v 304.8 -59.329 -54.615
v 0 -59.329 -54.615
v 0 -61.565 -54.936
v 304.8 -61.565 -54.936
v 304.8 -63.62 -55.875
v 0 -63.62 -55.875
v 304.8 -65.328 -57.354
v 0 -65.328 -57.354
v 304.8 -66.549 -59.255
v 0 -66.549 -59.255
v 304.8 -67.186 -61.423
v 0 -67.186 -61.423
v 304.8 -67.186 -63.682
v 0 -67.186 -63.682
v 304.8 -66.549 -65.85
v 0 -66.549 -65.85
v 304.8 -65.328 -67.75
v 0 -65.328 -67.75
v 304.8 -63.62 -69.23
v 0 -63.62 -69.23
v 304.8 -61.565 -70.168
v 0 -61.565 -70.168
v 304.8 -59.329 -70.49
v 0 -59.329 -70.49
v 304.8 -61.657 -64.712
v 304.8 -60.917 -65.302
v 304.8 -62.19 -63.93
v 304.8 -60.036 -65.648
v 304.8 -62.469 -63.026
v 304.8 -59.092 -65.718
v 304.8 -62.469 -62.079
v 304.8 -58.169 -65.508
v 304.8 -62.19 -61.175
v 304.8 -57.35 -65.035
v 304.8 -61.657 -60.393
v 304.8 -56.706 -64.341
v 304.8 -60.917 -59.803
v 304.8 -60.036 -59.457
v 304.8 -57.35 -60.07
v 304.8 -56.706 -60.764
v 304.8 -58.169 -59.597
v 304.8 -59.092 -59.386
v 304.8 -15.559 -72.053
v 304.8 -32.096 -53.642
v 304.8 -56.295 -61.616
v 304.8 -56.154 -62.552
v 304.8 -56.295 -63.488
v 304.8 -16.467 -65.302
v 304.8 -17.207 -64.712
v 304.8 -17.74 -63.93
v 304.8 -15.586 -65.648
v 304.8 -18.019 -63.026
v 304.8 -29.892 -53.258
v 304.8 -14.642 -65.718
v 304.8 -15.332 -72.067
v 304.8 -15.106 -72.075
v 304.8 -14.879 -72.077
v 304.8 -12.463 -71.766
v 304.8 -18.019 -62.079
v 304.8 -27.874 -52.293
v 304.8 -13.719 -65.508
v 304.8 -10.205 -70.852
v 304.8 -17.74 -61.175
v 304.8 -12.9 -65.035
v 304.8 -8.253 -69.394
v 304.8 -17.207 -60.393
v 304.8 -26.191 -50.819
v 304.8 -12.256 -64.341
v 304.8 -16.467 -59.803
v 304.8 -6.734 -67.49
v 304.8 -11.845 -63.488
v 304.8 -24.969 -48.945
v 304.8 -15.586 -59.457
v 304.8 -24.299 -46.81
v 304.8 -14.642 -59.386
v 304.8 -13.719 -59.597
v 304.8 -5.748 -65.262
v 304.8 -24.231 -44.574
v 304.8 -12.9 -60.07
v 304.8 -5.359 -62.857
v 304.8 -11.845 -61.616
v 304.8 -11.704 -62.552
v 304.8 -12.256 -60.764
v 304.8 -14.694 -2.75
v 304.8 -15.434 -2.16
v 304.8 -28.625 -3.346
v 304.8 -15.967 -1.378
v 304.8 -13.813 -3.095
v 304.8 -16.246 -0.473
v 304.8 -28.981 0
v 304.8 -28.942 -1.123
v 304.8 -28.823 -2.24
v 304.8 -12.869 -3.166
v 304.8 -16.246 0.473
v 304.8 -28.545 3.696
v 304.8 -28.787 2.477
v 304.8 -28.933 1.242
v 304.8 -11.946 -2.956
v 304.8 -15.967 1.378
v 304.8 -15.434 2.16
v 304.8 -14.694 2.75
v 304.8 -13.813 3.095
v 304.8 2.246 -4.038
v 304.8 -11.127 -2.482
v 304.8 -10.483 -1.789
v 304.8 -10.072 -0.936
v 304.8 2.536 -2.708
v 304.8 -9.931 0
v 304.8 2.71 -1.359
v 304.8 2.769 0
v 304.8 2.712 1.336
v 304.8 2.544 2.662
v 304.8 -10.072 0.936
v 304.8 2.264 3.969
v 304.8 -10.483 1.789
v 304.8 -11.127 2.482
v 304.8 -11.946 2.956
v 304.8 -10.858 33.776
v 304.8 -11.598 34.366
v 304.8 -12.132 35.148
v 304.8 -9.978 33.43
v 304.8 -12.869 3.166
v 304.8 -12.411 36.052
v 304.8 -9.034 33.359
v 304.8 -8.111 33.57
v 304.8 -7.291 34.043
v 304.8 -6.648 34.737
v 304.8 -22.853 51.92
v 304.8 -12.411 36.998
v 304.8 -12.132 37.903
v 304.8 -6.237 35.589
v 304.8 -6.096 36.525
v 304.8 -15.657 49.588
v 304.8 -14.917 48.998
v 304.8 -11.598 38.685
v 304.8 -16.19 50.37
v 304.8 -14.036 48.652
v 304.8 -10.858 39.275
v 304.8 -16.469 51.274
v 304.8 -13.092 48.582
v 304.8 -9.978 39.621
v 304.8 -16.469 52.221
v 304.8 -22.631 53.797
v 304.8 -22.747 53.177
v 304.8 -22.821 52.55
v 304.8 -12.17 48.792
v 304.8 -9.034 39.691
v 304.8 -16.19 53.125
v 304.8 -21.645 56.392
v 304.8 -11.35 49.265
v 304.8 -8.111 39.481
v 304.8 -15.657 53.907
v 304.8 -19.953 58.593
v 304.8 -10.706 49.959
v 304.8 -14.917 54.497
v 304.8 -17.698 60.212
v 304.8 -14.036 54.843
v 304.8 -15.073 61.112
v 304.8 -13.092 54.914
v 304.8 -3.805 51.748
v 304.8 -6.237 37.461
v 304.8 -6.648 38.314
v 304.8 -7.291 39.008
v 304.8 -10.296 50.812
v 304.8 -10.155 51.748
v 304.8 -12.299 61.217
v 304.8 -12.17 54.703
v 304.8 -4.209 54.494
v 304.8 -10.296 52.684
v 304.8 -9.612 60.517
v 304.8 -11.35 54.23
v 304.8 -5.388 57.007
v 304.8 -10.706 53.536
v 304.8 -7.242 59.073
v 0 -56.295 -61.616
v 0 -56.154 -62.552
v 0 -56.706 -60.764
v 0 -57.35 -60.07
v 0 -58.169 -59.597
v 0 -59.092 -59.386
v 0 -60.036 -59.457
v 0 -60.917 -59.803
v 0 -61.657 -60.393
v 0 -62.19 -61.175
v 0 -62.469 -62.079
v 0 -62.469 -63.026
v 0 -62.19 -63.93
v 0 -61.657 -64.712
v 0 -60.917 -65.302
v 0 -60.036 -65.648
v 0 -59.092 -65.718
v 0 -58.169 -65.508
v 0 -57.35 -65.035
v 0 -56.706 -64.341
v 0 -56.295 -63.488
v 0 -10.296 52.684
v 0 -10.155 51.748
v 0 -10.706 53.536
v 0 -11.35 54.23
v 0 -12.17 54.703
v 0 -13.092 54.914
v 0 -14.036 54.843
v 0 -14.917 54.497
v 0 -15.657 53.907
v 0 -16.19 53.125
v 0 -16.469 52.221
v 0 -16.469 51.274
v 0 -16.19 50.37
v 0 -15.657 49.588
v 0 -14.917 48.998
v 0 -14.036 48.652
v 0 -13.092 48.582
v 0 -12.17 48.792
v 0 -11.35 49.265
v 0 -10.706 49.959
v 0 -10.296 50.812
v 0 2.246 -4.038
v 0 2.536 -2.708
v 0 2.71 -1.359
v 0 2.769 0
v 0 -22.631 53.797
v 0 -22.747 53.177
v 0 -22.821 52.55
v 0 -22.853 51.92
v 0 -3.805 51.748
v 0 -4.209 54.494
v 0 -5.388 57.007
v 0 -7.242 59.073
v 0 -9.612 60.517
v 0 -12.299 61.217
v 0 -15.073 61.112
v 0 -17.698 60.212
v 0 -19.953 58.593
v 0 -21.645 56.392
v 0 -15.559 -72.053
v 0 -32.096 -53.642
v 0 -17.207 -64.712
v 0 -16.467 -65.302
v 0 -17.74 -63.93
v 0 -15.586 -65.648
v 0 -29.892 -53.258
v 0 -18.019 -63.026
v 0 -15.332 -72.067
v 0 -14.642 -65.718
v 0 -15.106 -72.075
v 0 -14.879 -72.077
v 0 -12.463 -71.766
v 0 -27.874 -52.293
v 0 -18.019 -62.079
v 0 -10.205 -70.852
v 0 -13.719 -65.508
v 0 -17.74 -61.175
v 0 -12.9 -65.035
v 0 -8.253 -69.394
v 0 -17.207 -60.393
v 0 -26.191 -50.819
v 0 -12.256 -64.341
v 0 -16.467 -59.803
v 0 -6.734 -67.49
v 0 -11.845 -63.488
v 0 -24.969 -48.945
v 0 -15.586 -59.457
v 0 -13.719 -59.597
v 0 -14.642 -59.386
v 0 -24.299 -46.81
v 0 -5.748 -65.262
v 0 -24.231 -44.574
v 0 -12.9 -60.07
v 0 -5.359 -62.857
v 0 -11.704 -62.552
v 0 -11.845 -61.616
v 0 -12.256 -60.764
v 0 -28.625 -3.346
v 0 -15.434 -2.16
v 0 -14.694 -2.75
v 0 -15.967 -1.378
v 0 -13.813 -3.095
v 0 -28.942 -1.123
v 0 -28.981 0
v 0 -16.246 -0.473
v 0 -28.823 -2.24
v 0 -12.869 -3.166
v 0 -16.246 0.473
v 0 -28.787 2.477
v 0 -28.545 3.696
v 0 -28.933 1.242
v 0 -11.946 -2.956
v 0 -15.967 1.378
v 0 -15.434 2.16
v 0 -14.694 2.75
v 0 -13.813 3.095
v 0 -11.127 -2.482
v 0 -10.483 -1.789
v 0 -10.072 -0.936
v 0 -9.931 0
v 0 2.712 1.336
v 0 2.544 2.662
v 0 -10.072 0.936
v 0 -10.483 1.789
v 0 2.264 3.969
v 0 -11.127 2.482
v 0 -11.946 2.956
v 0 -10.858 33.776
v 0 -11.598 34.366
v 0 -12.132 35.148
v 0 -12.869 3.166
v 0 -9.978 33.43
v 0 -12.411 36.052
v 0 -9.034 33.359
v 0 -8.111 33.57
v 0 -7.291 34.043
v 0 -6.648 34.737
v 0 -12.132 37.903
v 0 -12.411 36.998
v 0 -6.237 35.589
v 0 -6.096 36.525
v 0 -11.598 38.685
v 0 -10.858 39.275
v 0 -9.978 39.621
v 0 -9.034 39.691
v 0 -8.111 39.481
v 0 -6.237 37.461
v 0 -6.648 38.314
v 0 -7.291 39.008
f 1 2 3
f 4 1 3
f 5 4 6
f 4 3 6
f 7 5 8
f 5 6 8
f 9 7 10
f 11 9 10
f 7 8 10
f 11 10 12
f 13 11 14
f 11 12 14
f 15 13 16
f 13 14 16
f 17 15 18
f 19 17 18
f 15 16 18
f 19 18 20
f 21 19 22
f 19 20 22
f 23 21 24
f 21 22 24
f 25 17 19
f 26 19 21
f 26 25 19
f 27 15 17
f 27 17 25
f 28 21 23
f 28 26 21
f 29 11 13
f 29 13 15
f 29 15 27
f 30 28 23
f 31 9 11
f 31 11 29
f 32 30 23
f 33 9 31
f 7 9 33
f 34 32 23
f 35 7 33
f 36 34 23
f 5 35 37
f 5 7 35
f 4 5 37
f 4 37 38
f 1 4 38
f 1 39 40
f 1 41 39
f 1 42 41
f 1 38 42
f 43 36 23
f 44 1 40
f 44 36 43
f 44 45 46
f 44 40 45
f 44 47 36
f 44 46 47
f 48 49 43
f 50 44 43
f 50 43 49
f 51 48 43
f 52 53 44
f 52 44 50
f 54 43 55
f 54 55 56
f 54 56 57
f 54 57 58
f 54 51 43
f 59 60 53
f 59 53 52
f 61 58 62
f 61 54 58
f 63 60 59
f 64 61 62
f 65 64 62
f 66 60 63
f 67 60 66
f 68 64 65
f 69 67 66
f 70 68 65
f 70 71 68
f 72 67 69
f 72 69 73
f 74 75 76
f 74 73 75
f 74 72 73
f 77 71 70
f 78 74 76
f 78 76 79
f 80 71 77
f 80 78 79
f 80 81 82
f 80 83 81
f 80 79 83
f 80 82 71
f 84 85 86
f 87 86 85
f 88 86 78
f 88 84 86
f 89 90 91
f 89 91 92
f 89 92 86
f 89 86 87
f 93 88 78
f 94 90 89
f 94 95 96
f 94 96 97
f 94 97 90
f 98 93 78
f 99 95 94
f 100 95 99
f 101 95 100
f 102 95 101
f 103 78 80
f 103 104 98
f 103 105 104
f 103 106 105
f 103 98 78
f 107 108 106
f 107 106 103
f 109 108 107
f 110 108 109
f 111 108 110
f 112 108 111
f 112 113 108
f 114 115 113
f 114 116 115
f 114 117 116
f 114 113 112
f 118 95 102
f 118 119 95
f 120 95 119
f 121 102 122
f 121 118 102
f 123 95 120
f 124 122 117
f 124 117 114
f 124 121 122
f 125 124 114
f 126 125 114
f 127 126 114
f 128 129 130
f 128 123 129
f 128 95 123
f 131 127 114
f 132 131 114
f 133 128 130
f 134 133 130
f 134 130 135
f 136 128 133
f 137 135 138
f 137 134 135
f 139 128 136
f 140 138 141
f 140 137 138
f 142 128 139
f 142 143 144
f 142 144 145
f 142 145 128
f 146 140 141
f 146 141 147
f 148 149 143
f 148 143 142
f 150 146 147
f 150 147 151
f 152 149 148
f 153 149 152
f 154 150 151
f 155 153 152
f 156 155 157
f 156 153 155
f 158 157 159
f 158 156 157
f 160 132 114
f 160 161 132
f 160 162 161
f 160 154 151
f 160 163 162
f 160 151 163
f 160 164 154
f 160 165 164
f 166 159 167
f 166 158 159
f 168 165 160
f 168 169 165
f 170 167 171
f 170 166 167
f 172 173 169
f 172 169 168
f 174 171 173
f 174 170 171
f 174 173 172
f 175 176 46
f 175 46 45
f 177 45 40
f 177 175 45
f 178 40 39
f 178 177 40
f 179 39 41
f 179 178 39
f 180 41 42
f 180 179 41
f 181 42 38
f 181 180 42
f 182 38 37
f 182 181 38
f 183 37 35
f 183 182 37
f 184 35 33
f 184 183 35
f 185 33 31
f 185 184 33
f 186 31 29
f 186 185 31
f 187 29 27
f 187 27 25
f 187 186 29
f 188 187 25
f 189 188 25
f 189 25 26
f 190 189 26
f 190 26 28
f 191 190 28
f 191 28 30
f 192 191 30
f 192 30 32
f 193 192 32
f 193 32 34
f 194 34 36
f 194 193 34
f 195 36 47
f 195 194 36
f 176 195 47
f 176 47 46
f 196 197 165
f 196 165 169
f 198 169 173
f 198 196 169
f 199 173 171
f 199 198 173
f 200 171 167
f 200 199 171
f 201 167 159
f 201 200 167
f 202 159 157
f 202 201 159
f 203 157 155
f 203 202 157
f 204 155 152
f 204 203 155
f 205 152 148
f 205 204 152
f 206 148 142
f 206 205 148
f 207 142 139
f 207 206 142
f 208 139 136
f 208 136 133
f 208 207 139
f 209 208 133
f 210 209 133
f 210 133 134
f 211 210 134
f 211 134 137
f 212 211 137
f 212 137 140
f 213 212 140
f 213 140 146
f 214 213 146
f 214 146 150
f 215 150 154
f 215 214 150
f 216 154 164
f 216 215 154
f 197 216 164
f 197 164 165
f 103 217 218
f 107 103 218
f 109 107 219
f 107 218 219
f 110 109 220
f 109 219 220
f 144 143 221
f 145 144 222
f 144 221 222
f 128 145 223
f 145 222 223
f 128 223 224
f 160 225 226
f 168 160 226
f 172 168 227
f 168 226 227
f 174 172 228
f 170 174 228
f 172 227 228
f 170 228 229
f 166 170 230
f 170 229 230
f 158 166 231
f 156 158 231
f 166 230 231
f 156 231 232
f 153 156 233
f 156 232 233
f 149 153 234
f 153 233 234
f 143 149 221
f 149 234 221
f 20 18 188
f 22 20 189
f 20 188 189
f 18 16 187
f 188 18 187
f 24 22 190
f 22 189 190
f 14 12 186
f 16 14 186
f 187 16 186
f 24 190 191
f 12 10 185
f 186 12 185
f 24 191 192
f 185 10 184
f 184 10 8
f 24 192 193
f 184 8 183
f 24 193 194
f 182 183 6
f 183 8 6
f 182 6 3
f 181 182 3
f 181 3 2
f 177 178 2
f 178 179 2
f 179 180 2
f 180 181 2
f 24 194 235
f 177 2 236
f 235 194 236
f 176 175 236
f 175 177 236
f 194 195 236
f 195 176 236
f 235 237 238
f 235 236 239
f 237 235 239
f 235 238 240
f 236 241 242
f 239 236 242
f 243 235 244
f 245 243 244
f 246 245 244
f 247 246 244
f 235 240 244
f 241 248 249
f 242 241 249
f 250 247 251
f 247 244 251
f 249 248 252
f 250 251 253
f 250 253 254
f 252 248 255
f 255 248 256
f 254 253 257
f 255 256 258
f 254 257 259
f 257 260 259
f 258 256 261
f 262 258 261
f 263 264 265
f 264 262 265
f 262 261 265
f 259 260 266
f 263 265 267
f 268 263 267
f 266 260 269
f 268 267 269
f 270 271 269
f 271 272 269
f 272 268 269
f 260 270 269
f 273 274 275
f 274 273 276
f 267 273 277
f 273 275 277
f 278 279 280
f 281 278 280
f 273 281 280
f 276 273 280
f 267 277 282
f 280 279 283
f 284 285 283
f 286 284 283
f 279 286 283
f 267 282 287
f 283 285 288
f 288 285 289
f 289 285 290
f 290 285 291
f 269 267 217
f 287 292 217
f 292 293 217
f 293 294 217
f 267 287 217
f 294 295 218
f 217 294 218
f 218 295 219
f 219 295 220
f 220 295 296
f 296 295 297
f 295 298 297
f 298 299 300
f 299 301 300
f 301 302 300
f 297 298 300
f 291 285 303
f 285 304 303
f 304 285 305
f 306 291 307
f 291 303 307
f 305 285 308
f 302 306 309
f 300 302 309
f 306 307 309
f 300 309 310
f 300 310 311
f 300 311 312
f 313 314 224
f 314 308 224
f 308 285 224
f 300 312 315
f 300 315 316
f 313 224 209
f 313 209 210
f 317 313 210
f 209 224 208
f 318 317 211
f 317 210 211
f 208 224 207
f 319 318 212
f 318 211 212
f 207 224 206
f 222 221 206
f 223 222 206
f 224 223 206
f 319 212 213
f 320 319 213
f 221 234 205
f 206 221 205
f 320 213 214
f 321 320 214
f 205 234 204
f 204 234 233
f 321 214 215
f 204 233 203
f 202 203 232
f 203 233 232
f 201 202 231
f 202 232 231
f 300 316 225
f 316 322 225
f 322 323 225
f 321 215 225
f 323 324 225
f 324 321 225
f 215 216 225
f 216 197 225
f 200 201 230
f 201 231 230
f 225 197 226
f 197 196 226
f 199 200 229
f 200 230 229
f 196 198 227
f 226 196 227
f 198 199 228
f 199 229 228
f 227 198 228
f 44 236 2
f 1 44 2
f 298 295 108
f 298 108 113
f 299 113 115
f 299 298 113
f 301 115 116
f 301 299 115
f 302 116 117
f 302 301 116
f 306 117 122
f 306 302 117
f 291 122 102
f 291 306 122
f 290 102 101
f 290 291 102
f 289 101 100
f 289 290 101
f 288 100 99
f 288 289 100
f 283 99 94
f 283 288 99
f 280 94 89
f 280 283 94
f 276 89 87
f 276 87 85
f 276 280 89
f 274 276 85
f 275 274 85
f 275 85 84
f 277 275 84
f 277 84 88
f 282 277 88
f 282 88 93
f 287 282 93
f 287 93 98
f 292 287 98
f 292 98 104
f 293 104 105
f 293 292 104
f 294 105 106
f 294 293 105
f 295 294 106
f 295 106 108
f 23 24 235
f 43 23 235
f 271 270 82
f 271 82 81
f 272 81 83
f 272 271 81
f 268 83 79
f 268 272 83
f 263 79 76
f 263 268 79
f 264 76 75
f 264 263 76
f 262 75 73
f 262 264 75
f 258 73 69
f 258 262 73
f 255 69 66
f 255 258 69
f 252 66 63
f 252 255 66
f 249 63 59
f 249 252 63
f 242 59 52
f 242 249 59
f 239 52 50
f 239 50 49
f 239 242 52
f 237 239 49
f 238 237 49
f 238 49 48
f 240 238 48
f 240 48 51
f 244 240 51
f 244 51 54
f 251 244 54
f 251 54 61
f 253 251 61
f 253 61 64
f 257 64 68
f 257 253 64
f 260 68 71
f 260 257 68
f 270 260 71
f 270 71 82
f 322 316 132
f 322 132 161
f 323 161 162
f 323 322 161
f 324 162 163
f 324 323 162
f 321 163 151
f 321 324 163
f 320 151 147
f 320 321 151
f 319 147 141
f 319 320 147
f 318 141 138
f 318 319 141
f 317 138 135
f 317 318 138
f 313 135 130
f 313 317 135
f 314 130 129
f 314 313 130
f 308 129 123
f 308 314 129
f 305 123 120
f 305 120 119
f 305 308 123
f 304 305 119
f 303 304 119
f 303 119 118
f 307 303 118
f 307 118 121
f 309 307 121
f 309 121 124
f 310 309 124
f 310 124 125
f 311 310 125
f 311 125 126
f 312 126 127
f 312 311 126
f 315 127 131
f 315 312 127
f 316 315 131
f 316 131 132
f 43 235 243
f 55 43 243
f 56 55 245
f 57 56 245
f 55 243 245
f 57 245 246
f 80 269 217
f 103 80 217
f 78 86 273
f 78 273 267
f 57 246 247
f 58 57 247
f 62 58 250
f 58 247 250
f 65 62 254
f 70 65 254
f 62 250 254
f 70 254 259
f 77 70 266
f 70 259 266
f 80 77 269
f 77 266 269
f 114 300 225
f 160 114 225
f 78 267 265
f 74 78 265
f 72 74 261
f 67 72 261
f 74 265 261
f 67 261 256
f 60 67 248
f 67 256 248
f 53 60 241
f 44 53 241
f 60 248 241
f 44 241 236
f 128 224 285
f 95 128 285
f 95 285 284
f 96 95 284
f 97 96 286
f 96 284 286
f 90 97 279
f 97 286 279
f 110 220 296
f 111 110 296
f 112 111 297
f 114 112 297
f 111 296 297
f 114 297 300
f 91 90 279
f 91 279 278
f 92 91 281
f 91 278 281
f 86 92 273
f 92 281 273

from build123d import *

# Parameters (mm, degrees)
F0_R     = 3.175
F1_DEPTH = 304.8


with BuildPart() as f1:
    # F0 (on Right) → F1 (new body)
    with BuildSketch(Plane.YZ):
        with BuildLine():
            ThreePointArc((-22.8529511317, 51.9202167742), (-13.4157885587, 42.2230655236), (-3.8045140282, 51.7476747914))
            ThreePointArc((-3.8045140282, 51.7476747914), (-12.2986988853, 61.2167320381), (-22.6314001471, 53.7971965969))
            Line((-22.6314001471, 53.7971965969), (-22.8529511317, 51.9202167742))
        make_face()
        with Locations((-13.3295140282, 51.7476747914)):
            Circle(F0_R, mode=Mode.SUBTRACT)
        with BuildLine():
            Line((2.2644576156, 3.968923864), (-3.8045140282, 51.7476747914))
            ThreePointArc((-3.8045140282, 51.7476747914), (-13.4157885587, 42.2230655236), (-22.8529511317, 51.9202167742))
            Line((-22.8529511317, 51.9202167742), (-28.545122604, 3.6961431112))
            ThreePointArc((-28.545122604, 3.6961431112), (-13.2469481423, 15.8743778228), (2.2644576156, 3.968923864))
        make_face()
        with Locations((-9.2709995806, 36.5252)):
            Circle(F0_R, mode=Mode.SUBTRACT)
        with BuildLine():
            Line((-22.8529511317, 51.9202167742), (-22.6314001471, 53.7971965969))
            ThreePointArc((-22.6314001471, 53.7971965969), (-22.78884603, 52.8642154666), (-22.8529511317, 51.9202167742))
        make_face()
        with BuildLine():
            Line((2.7685998529, 0), (2.2644576156, 3.968923864))
            ThreePointArc((2.2644576156, 3.968923864), (-13.2469481423, 15.8743778228), (-28.545122604, 3.6961431112))
            Line((-28.545122604, 3.6961431112), (-28.9814001471, 0))
            Line((-28.9814001471, 0), (-28.6248095933, -3.3458322221))
            ThreePointArc((-28.6248095933, -3.3458322221), (-13.462164486, -15.8710130973), (2.2464969737, -4.0378428646))
            Line((2.2464969737, -4.0378428646), (2.7685998529, 0))
        make_face()
        with Locations((-13.1064001471, 0)):
            Circle(F0_R, mode=Mode.SUBTRACT)
        with BuildLine():
            ThreePointArc((2.7685998529, 0), (2.6420599679, 2.0004072107), (2.2644576156, 3.968923864))
            Line((2.2644576156, 3.968923864), (2.7685998529, 0))
        make_face()
        with BuildLine():
            Line((-28.9814001471, 0), (-28.545122604, 3.6961431112))
            ThreePointArc((-28.545122604, 3.6961431112), (-28.8719534834, 1.8609011253), (-28.9814001471, 0))
        make_face()
        with BuildLine():
            ThreePointArc((2.2464969737, -4.0378428646), (2.637533078, -2.0357287648), (2.7685998529, 0))
            Line((2.7685998529, 0), (2.2464969737, -4.0378428646))
        make_face()
        with BuildLine():
            Line((-28.6248095933, -3.3458322221), (-28.9814001471, 0))
            ThreePointArc((-28.9814001471, 0), (-28.8920007844, -1.6823904185), (-28.6248095933, -3.3458322221))
        make_face()
        with BuildLine():
            Line((-5.3589790656, -62.8571261481), (2.2464969737, -4.0378428646))
            ThreePointArc((2.2464969737, -4.0378428646), (-13.462164486, -15.8710130973), (-28.6248095933, -3.3458322221))
            Line((-28.6248095933, -3.3458322221), (-24.2308362037, -44.5737828668))
            ThreePointArc((-24.2308362037, -44.5737828668), (-26.1909962764, -50.8187140835), (-32.0960141584, -53.6422149647))
            Line((-32.0960141584, -53.6422149647), (-59.3291009865, -54.6148252086))
            ThreePointArc((-59.3291009865, -54.6148252086), (-53.7164409108, -56.9396651329), (-51.3916009865, -62.5523252086))
            ThreePointArc((-51.3916009865, -62.5523252086), (-53.7164409108, -68.1649852842), (-59.3291009865, -70.4898252086))
            Line((-59.3291009865, -70.4898252086), (-15.5585914323, -72.0530576926))
            ThreePointArc((-15.5585914323, -72.0530576926), (-21.3696124649, -55.5810351021), (-5.3541009865, -62.5523252086))
            ThreePointArc((-5.3541009865, -62.5523252086), (-5.3553205843, -62.7047451945), (-5.3589790656, -62.8571261481))
        make_face()
        with BuildLine():
            ThreePointArc((-14.8791009865, -72.0773252086), (-8.2525484872, -69.3944321191), (-5.3589790656, -62.8571261481))
            ThreePointArc((-5.3589790656, -62.8571261481), (-5.3553205843, -62.7047451945), (-5.3541009865, -62.5523252086))
            ThreePointArc((-5.3541009865, -62.5523252086), (-21.3696124649, -55.5810351021), (-15.5585914323, -72.0530576926))
            Line((-15.5585914323, -72.0530576926), (-14.8791009865, -72.0773252086))
        make_face()
        with Locations((-14.8791009865, -62.5523252086)):
            Circle(F0_R, mode=Mode.SUBTRACT)
        with BuildLine():
            ThreePointArc((-15.5585914323, -72.0530576926), (-15.2190628146, -72.0712563962), (-14.8791009865, -72.0773252086))
            Line((-14.8791009865, -72.0773252086), (-15.5585914323, -72.0530576926))
        make_face()
        with BuildLine():
            ThreePointArc((-51.3916009865, -62.5523252086), (-53.7164409108, -56.9396651329), (-59.3291009865, -54.6148252086))
            ThreePointArc((-59.3291009865, -54.6148252086), (-67.2666009865, -62.5523252086), (-59.3291009865, -70.4898252086))
            ThreePointArc((-59.3291009865, -70.4898252086), (-53.7164409108, -68.1649852842), (-51.3916009865, -62.5523252086))
        make_face()
        with Locations((-59.3291009865, -62.5523252086)):
            Circle(F0_R, mode=Mode.SUBTRACT)
    extrude(amount=F1_DEPTH)


solid = f1.part
